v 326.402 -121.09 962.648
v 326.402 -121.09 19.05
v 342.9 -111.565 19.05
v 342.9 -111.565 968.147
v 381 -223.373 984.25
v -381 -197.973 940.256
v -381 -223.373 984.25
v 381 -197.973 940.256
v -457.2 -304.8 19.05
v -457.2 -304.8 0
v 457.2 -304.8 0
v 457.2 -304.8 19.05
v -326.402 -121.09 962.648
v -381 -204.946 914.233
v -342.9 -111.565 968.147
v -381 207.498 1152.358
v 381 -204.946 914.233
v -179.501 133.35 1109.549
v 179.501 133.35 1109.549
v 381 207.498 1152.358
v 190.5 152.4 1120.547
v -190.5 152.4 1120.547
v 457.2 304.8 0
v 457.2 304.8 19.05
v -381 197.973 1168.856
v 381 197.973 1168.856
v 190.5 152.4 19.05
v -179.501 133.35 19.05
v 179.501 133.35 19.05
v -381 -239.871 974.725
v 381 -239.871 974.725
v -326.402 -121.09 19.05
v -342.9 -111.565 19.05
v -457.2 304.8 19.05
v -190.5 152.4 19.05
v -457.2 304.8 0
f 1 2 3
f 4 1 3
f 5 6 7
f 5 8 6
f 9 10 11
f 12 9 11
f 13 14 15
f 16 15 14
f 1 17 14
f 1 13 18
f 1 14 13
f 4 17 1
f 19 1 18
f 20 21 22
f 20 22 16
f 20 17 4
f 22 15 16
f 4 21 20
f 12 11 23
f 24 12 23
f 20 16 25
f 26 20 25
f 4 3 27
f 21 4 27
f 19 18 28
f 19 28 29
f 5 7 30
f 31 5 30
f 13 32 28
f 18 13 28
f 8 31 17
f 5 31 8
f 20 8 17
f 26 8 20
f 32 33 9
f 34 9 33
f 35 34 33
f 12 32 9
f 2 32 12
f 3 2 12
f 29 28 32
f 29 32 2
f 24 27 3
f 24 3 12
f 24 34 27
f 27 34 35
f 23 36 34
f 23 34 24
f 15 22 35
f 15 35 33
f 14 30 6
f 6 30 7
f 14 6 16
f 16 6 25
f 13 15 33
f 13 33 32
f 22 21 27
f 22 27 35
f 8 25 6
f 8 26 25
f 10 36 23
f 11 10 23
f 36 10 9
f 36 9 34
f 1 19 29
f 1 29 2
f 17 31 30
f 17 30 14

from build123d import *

# Parameters (mm, degrees)
F2_DEPTH = 381
F0_W     = 914.4
F0_H     = 609.6
F3_DEPTH = 19.05
F4_REACH = 1907.1780931


with BuildPart() as f2:
    # F1 (on Right) → F2 (new body, symmetric)
    with BuildSketch(Plane.YZ):
        Polygon((-197.9734073051, 940.2559094878), (-223.3734073051, 984.25), (-239.8711912472, 974.725), (-204.9461912472, 914.2331255457), (207.4984073051, 1152.3581255457), (197.9734073051, 1168.8559094878), align=None)
    extrude(amount=F2_DEPTH, both=True)



with BuildPart() as f3:
    # F0 (on Top) → F3 (new body)
    with BuildSketch(Plane.XY):
        Rectangle(F0_W, F0_H)
        Polygon((-342.9, -111.5645430735), (-190.5, 152.4), (190.5, 152.4), (342.9, -111.5645430735), (326.4022160579, -121.0895430735), (179.5014773719, 133.35), (-179.5014773719, 133.35), (-326.4022160579, -121.0895430735), align=None, mode=Mode.SUBTRACT)
        Polygon((190.5, 152.4), (-190.5, 152.4), (-342.9, -111.5645430735), (-326.4022160579, -121.0895430735), (-179.5014773719, 133.35), (179.5014773719, 133.35), (326.4022160579, -121.0895430735), (342.9, -111.5645430735), align=None)
    extrude(amount=F3_DEPTH)


with BuildPart() as f2_1:
    add(f2.part)

    add(f3.part)  # F4 merges F3
    f4_end = f2_1.faces().sort_by_distance((0, 1.276108029, 1033.2956255457))[0]
    # F0 (on Top) → F4 (join, up to a face of the model that its end follows)
    with BuildSketch(Plane.XY):
        Polygon((190.5, 152.4), (-190.5, 152.4), (-342.9, -111.5645430735), (-326.4022160579, -121.0895430735), (-179.5014773719, 133.35), (179.5014773719, 133.35), (326.4022160579, -121.0895430735), (342.9, -111.5645430735), align=None)
    f4_long = extrude(amount=F4_REACH, mode=Mode.PRIVATE)
    add(split(f4_long, bisect_by=f4_end, keep=Keep.TOP, mode=Mode.PRIVATE))


solid = f2_1.part
